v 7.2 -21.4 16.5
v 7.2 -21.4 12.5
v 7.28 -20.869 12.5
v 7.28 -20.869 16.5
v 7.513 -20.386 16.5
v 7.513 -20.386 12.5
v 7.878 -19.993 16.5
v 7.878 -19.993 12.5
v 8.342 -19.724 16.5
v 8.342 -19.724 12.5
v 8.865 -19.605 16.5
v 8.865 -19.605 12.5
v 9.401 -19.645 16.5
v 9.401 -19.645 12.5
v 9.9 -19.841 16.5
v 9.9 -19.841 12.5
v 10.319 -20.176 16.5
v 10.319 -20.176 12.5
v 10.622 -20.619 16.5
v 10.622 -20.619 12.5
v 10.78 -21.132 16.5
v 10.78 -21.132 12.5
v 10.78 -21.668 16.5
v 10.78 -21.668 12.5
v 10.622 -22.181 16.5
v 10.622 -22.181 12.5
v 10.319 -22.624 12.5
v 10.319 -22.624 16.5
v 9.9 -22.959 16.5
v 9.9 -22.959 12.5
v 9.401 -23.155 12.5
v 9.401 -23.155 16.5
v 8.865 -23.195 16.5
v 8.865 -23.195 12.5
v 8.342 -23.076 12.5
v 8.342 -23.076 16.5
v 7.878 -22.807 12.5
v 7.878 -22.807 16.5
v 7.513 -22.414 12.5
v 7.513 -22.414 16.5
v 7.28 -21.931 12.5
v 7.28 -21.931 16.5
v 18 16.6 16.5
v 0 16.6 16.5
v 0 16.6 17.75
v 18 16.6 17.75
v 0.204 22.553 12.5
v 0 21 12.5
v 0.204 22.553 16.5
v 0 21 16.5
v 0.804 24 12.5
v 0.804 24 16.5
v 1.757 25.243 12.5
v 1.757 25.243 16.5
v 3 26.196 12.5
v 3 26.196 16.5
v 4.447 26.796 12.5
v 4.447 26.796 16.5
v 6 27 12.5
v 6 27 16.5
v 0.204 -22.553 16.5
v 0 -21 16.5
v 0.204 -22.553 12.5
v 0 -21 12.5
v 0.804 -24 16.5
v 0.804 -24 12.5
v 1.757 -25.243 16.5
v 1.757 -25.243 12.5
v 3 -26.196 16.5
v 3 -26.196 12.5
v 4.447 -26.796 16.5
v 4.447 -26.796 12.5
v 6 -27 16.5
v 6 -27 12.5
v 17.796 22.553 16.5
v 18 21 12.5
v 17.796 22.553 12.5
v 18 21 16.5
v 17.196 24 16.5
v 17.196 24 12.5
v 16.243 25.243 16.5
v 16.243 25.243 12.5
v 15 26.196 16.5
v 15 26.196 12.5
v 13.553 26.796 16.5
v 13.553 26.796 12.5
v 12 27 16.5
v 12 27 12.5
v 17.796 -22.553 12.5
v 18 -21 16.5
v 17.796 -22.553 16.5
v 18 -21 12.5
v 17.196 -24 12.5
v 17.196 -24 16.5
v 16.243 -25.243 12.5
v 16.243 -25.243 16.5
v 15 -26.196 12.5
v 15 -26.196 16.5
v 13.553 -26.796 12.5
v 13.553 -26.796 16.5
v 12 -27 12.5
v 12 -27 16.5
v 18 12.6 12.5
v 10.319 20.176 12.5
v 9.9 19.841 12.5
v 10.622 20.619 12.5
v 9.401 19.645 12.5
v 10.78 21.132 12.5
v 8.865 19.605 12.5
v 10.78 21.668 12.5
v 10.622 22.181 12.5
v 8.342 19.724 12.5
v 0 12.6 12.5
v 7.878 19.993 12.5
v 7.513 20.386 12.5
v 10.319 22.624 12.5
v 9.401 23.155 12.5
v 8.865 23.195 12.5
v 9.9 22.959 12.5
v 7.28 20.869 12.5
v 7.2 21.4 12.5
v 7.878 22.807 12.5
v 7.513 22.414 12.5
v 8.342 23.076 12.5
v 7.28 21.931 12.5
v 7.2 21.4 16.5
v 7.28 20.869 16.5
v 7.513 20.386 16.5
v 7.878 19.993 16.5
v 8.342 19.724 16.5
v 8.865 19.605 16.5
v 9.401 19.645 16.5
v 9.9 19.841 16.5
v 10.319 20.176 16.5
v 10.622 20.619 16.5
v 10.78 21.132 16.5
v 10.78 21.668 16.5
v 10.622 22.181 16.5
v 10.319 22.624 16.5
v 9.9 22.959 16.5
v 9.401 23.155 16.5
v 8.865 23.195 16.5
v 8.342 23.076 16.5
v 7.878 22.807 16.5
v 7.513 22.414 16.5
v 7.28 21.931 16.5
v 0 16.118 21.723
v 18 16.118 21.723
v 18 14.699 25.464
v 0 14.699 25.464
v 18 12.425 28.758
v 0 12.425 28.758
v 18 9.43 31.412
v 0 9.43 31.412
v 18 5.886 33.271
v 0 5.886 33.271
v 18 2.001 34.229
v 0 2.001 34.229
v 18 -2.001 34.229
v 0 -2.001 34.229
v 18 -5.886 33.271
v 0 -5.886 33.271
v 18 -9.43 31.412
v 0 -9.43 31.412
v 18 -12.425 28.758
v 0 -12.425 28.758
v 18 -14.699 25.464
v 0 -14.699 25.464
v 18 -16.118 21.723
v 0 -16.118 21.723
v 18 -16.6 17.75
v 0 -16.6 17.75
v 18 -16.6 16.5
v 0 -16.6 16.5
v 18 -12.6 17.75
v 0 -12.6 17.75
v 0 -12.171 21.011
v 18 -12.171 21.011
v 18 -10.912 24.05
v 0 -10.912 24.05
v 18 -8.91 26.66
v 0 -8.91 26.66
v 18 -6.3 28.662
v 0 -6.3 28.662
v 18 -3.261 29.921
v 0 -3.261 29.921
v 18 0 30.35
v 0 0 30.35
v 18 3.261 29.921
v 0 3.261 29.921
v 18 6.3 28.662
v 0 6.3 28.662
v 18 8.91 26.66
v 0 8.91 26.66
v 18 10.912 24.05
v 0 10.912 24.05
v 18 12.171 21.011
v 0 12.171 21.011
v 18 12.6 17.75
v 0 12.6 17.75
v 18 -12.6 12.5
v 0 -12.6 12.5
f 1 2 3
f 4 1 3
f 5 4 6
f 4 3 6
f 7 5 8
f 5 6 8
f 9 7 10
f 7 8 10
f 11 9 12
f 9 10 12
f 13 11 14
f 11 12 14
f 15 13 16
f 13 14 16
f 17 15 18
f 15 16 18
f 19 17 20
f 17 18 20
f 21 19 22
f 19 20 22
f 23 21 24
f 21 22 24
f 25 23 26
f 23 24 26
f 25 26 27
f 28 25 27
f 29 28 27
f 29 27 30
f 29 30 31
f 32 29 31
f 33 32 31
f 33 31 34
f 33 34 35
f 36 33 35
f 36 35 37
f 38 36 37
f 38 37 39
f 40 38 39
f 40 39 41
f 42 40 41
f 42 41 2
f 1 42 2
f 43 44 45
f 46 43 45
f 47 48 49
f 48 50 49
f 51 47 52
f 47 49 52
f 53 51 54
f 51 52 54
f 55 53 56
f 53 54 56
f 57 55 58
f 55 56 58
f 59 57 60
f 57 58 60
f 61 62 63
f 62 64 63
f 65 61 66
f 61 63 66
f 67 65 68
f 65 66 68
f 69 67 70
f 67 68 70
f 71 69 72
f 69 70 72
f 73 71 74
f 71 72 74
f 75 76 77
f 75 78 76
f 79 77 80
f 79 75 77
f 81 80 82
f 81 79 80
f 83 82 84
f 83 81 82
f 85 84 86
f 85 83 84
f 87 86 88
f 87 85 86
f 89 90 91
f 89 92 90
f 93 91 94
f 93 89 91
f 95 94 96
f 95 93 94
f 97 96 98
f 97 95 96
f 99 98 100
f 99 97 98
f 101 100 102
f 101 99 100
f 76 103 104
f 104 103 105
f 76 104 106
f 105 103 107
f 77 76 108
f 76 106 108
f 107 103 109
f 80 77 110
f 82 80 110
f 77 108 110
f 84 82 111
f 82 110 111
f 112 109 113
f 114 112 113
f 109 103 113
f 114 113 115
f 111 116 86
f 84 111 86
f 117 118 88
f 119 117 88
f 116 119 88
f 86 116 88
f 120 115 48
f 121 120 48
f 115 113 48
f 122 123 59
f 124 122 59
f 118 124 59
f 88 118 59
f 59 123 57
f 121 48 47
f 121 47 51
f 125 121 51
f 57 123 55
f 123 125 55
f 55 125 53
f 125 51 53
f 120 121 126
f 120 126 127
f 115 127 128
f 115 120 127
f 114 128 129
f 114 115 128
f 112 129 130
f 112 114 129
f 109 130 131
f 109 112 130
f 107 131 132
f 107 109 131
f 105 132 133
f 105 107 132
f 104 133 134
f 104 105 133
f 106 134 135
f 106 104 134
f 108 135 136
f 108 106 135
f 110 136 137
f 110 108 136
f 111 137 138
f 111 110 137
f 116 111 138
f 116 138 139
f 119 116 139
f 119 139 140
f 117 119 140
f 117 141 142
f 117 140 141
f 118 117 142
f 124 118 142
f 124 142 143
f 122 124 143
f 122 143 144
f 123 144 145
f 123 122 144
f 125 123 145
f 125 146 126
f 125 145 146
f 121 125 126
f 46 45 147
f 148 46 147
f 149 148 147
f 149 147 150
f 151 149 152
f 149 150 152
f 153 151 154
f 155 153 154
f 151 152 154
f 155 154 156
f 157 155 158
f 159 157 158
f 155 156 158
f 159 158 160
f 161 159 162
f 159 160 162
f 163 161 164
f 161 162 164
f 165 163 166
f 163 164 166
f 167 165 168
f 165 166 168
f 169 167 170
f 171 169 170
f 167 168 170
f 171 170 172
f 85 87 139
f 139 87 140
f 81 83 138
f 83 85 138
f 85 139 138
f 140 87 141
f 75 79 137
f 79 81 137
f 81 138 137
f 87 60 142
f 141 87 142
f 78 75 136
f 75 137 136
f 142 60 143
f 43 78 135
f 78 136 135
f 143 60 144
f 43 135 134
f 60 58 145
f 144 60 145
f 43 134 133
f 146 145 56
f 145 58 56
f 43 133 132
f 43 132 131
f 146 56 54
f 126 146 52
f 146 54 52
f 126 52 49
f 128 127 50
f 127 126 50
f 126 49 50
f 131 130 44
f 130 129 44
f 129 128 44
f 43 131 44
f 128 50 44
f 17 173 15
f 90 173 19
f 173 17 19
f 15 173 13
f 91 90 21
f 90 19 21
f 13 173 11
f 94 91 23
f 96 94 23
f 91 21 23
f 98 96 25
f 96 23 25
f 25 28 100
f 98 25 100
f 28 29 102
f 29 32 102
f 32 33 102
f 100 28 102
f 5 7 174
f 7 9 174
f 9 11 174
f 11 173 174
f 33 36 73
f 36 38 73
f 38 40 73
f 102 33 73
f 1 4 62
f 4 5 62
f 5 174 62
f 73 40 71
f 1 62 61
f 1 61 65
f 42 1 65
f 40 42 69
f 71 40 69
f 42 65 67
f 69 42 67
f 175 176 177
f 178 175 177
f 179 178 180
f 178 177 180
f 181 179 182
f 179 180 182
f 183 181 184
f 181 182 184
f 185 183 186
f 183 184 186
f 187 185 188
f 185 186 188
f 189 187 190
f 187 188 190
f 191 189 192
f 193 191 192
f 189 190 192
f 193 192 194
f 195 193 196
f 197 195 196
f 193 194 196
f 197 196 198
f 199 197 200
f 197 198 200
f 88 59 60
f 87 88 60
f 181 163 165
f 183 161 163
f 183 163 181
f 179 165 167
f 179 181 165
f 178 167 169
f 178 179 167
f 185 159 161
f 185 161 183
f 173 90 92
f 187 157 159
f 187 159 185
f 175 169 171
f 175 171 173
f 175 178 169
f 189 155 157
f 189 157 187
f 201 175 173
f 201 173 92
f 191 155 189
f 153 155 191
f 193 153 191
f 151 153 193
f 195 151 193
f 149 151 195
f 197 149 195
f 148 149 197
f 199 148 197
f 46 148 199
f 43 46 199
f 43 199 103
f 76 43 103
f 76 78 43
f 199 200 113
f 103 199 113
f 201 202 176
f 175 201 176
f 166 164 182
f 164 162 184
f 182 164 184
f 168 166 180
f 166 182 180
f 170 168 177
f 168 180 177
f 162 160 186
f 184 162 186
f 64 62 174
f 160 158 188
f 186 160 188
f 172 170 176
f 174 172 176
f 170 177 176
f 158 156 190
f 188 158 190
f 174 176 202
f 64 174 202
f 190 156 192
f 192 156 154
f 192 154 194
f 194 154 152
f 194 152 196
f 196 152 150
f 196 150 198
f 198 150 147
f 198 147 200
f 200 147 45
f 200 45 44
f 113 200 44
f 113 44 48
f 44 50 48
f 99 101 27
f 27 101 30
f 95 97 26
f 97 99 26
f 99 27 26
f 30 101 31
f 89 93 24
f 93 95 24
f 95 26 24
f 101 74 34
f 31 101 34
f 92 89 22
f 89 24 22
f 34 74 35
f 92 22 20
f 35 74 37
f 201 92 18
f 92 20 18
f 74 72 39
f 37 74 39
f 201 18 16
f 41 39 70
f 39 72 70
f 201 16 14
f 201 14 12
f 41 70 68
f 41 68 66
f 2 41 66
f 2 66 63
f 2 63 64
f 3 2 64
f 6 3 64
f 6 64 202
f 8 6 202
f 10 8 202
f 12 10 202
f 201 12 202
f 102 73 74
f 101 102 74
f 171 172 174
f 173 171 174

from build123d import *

# Parameters (mm, degrees)
MOTOR_CLAMP_EXTRUDE_DEPTH = 18
CLAMP_MOUNTING_HOLE_D     = 3.6
CLAMP_CORNER_FILLETS_R    = 6


with BuildPart() as part:
    # Motor Clamp Sketch → Motor Clamp Extrude (new body)
    with BuildSketch(Plane(origin=(0, 0, 0), x_dir=(0, 0, -1), z_dir=(1, 0, 0))):
        with BuildLine():
            Line((-17.75, -16.6), (-16.5, -16.6))
            Line((-16.5, -16.6), (-16.5, -27))
            Line((-16.5, -27), (-12.5, -27))
            Line((-12.5, -27), (-12.5, -12.6))
            Line((-12.5, -12.6), (-17.75, -12.6))
            ThreePointArc((-17.75, -12.6), (-30.35, 0), (-17.75, 12.6))
            Line((-17.75, 12.6), (-12.5, 12.6))
            Line((-12.5, 12.6), (-12.5, 27))
            Line((-12.5, 27), (-16.5, 27))
            Line((-16.5, 27), (-16.5, 16.6))
            Line((-16.5, 16.6), (-17.75, 16.6))
            ThreePointArc((-17.75, 16.6), (-34.35, 0), (-17.75, -16.6))
        make_face()
    extrude(amount=MOTOR_CLAMP_EXTRUDE_DEPTH)

    # Clamp Mounting Hole (through all)
    with Locations(Plane.XY.offset(16.5)):
        with Locations((9, -21.4)):
            clamp_mounting_hole = Hole(CLAMP_MOUNTING_HOLE_D / 2)

    # Clamp Hole Mirro: Clamp Mounting Hole across plane
    add(clamp_mounting_hole.mirror(Plane.ZX), mode=Mode.SUBTRACT)

    # Clamp Corner Fillets
    clamp_corner_fillets_edges = [part.edges().sort_by_distance(p)[0] for p in [
        (0, 27, 14.5),
        (0, -27, 14.5),
        (18, -27, 14.5),
        (18, 27, 14.5),
    ]]
    fillet(clamp_corner_fillets_edges, radius=CLAMP_CORNER_FILLETS_R)


solid = part.part
